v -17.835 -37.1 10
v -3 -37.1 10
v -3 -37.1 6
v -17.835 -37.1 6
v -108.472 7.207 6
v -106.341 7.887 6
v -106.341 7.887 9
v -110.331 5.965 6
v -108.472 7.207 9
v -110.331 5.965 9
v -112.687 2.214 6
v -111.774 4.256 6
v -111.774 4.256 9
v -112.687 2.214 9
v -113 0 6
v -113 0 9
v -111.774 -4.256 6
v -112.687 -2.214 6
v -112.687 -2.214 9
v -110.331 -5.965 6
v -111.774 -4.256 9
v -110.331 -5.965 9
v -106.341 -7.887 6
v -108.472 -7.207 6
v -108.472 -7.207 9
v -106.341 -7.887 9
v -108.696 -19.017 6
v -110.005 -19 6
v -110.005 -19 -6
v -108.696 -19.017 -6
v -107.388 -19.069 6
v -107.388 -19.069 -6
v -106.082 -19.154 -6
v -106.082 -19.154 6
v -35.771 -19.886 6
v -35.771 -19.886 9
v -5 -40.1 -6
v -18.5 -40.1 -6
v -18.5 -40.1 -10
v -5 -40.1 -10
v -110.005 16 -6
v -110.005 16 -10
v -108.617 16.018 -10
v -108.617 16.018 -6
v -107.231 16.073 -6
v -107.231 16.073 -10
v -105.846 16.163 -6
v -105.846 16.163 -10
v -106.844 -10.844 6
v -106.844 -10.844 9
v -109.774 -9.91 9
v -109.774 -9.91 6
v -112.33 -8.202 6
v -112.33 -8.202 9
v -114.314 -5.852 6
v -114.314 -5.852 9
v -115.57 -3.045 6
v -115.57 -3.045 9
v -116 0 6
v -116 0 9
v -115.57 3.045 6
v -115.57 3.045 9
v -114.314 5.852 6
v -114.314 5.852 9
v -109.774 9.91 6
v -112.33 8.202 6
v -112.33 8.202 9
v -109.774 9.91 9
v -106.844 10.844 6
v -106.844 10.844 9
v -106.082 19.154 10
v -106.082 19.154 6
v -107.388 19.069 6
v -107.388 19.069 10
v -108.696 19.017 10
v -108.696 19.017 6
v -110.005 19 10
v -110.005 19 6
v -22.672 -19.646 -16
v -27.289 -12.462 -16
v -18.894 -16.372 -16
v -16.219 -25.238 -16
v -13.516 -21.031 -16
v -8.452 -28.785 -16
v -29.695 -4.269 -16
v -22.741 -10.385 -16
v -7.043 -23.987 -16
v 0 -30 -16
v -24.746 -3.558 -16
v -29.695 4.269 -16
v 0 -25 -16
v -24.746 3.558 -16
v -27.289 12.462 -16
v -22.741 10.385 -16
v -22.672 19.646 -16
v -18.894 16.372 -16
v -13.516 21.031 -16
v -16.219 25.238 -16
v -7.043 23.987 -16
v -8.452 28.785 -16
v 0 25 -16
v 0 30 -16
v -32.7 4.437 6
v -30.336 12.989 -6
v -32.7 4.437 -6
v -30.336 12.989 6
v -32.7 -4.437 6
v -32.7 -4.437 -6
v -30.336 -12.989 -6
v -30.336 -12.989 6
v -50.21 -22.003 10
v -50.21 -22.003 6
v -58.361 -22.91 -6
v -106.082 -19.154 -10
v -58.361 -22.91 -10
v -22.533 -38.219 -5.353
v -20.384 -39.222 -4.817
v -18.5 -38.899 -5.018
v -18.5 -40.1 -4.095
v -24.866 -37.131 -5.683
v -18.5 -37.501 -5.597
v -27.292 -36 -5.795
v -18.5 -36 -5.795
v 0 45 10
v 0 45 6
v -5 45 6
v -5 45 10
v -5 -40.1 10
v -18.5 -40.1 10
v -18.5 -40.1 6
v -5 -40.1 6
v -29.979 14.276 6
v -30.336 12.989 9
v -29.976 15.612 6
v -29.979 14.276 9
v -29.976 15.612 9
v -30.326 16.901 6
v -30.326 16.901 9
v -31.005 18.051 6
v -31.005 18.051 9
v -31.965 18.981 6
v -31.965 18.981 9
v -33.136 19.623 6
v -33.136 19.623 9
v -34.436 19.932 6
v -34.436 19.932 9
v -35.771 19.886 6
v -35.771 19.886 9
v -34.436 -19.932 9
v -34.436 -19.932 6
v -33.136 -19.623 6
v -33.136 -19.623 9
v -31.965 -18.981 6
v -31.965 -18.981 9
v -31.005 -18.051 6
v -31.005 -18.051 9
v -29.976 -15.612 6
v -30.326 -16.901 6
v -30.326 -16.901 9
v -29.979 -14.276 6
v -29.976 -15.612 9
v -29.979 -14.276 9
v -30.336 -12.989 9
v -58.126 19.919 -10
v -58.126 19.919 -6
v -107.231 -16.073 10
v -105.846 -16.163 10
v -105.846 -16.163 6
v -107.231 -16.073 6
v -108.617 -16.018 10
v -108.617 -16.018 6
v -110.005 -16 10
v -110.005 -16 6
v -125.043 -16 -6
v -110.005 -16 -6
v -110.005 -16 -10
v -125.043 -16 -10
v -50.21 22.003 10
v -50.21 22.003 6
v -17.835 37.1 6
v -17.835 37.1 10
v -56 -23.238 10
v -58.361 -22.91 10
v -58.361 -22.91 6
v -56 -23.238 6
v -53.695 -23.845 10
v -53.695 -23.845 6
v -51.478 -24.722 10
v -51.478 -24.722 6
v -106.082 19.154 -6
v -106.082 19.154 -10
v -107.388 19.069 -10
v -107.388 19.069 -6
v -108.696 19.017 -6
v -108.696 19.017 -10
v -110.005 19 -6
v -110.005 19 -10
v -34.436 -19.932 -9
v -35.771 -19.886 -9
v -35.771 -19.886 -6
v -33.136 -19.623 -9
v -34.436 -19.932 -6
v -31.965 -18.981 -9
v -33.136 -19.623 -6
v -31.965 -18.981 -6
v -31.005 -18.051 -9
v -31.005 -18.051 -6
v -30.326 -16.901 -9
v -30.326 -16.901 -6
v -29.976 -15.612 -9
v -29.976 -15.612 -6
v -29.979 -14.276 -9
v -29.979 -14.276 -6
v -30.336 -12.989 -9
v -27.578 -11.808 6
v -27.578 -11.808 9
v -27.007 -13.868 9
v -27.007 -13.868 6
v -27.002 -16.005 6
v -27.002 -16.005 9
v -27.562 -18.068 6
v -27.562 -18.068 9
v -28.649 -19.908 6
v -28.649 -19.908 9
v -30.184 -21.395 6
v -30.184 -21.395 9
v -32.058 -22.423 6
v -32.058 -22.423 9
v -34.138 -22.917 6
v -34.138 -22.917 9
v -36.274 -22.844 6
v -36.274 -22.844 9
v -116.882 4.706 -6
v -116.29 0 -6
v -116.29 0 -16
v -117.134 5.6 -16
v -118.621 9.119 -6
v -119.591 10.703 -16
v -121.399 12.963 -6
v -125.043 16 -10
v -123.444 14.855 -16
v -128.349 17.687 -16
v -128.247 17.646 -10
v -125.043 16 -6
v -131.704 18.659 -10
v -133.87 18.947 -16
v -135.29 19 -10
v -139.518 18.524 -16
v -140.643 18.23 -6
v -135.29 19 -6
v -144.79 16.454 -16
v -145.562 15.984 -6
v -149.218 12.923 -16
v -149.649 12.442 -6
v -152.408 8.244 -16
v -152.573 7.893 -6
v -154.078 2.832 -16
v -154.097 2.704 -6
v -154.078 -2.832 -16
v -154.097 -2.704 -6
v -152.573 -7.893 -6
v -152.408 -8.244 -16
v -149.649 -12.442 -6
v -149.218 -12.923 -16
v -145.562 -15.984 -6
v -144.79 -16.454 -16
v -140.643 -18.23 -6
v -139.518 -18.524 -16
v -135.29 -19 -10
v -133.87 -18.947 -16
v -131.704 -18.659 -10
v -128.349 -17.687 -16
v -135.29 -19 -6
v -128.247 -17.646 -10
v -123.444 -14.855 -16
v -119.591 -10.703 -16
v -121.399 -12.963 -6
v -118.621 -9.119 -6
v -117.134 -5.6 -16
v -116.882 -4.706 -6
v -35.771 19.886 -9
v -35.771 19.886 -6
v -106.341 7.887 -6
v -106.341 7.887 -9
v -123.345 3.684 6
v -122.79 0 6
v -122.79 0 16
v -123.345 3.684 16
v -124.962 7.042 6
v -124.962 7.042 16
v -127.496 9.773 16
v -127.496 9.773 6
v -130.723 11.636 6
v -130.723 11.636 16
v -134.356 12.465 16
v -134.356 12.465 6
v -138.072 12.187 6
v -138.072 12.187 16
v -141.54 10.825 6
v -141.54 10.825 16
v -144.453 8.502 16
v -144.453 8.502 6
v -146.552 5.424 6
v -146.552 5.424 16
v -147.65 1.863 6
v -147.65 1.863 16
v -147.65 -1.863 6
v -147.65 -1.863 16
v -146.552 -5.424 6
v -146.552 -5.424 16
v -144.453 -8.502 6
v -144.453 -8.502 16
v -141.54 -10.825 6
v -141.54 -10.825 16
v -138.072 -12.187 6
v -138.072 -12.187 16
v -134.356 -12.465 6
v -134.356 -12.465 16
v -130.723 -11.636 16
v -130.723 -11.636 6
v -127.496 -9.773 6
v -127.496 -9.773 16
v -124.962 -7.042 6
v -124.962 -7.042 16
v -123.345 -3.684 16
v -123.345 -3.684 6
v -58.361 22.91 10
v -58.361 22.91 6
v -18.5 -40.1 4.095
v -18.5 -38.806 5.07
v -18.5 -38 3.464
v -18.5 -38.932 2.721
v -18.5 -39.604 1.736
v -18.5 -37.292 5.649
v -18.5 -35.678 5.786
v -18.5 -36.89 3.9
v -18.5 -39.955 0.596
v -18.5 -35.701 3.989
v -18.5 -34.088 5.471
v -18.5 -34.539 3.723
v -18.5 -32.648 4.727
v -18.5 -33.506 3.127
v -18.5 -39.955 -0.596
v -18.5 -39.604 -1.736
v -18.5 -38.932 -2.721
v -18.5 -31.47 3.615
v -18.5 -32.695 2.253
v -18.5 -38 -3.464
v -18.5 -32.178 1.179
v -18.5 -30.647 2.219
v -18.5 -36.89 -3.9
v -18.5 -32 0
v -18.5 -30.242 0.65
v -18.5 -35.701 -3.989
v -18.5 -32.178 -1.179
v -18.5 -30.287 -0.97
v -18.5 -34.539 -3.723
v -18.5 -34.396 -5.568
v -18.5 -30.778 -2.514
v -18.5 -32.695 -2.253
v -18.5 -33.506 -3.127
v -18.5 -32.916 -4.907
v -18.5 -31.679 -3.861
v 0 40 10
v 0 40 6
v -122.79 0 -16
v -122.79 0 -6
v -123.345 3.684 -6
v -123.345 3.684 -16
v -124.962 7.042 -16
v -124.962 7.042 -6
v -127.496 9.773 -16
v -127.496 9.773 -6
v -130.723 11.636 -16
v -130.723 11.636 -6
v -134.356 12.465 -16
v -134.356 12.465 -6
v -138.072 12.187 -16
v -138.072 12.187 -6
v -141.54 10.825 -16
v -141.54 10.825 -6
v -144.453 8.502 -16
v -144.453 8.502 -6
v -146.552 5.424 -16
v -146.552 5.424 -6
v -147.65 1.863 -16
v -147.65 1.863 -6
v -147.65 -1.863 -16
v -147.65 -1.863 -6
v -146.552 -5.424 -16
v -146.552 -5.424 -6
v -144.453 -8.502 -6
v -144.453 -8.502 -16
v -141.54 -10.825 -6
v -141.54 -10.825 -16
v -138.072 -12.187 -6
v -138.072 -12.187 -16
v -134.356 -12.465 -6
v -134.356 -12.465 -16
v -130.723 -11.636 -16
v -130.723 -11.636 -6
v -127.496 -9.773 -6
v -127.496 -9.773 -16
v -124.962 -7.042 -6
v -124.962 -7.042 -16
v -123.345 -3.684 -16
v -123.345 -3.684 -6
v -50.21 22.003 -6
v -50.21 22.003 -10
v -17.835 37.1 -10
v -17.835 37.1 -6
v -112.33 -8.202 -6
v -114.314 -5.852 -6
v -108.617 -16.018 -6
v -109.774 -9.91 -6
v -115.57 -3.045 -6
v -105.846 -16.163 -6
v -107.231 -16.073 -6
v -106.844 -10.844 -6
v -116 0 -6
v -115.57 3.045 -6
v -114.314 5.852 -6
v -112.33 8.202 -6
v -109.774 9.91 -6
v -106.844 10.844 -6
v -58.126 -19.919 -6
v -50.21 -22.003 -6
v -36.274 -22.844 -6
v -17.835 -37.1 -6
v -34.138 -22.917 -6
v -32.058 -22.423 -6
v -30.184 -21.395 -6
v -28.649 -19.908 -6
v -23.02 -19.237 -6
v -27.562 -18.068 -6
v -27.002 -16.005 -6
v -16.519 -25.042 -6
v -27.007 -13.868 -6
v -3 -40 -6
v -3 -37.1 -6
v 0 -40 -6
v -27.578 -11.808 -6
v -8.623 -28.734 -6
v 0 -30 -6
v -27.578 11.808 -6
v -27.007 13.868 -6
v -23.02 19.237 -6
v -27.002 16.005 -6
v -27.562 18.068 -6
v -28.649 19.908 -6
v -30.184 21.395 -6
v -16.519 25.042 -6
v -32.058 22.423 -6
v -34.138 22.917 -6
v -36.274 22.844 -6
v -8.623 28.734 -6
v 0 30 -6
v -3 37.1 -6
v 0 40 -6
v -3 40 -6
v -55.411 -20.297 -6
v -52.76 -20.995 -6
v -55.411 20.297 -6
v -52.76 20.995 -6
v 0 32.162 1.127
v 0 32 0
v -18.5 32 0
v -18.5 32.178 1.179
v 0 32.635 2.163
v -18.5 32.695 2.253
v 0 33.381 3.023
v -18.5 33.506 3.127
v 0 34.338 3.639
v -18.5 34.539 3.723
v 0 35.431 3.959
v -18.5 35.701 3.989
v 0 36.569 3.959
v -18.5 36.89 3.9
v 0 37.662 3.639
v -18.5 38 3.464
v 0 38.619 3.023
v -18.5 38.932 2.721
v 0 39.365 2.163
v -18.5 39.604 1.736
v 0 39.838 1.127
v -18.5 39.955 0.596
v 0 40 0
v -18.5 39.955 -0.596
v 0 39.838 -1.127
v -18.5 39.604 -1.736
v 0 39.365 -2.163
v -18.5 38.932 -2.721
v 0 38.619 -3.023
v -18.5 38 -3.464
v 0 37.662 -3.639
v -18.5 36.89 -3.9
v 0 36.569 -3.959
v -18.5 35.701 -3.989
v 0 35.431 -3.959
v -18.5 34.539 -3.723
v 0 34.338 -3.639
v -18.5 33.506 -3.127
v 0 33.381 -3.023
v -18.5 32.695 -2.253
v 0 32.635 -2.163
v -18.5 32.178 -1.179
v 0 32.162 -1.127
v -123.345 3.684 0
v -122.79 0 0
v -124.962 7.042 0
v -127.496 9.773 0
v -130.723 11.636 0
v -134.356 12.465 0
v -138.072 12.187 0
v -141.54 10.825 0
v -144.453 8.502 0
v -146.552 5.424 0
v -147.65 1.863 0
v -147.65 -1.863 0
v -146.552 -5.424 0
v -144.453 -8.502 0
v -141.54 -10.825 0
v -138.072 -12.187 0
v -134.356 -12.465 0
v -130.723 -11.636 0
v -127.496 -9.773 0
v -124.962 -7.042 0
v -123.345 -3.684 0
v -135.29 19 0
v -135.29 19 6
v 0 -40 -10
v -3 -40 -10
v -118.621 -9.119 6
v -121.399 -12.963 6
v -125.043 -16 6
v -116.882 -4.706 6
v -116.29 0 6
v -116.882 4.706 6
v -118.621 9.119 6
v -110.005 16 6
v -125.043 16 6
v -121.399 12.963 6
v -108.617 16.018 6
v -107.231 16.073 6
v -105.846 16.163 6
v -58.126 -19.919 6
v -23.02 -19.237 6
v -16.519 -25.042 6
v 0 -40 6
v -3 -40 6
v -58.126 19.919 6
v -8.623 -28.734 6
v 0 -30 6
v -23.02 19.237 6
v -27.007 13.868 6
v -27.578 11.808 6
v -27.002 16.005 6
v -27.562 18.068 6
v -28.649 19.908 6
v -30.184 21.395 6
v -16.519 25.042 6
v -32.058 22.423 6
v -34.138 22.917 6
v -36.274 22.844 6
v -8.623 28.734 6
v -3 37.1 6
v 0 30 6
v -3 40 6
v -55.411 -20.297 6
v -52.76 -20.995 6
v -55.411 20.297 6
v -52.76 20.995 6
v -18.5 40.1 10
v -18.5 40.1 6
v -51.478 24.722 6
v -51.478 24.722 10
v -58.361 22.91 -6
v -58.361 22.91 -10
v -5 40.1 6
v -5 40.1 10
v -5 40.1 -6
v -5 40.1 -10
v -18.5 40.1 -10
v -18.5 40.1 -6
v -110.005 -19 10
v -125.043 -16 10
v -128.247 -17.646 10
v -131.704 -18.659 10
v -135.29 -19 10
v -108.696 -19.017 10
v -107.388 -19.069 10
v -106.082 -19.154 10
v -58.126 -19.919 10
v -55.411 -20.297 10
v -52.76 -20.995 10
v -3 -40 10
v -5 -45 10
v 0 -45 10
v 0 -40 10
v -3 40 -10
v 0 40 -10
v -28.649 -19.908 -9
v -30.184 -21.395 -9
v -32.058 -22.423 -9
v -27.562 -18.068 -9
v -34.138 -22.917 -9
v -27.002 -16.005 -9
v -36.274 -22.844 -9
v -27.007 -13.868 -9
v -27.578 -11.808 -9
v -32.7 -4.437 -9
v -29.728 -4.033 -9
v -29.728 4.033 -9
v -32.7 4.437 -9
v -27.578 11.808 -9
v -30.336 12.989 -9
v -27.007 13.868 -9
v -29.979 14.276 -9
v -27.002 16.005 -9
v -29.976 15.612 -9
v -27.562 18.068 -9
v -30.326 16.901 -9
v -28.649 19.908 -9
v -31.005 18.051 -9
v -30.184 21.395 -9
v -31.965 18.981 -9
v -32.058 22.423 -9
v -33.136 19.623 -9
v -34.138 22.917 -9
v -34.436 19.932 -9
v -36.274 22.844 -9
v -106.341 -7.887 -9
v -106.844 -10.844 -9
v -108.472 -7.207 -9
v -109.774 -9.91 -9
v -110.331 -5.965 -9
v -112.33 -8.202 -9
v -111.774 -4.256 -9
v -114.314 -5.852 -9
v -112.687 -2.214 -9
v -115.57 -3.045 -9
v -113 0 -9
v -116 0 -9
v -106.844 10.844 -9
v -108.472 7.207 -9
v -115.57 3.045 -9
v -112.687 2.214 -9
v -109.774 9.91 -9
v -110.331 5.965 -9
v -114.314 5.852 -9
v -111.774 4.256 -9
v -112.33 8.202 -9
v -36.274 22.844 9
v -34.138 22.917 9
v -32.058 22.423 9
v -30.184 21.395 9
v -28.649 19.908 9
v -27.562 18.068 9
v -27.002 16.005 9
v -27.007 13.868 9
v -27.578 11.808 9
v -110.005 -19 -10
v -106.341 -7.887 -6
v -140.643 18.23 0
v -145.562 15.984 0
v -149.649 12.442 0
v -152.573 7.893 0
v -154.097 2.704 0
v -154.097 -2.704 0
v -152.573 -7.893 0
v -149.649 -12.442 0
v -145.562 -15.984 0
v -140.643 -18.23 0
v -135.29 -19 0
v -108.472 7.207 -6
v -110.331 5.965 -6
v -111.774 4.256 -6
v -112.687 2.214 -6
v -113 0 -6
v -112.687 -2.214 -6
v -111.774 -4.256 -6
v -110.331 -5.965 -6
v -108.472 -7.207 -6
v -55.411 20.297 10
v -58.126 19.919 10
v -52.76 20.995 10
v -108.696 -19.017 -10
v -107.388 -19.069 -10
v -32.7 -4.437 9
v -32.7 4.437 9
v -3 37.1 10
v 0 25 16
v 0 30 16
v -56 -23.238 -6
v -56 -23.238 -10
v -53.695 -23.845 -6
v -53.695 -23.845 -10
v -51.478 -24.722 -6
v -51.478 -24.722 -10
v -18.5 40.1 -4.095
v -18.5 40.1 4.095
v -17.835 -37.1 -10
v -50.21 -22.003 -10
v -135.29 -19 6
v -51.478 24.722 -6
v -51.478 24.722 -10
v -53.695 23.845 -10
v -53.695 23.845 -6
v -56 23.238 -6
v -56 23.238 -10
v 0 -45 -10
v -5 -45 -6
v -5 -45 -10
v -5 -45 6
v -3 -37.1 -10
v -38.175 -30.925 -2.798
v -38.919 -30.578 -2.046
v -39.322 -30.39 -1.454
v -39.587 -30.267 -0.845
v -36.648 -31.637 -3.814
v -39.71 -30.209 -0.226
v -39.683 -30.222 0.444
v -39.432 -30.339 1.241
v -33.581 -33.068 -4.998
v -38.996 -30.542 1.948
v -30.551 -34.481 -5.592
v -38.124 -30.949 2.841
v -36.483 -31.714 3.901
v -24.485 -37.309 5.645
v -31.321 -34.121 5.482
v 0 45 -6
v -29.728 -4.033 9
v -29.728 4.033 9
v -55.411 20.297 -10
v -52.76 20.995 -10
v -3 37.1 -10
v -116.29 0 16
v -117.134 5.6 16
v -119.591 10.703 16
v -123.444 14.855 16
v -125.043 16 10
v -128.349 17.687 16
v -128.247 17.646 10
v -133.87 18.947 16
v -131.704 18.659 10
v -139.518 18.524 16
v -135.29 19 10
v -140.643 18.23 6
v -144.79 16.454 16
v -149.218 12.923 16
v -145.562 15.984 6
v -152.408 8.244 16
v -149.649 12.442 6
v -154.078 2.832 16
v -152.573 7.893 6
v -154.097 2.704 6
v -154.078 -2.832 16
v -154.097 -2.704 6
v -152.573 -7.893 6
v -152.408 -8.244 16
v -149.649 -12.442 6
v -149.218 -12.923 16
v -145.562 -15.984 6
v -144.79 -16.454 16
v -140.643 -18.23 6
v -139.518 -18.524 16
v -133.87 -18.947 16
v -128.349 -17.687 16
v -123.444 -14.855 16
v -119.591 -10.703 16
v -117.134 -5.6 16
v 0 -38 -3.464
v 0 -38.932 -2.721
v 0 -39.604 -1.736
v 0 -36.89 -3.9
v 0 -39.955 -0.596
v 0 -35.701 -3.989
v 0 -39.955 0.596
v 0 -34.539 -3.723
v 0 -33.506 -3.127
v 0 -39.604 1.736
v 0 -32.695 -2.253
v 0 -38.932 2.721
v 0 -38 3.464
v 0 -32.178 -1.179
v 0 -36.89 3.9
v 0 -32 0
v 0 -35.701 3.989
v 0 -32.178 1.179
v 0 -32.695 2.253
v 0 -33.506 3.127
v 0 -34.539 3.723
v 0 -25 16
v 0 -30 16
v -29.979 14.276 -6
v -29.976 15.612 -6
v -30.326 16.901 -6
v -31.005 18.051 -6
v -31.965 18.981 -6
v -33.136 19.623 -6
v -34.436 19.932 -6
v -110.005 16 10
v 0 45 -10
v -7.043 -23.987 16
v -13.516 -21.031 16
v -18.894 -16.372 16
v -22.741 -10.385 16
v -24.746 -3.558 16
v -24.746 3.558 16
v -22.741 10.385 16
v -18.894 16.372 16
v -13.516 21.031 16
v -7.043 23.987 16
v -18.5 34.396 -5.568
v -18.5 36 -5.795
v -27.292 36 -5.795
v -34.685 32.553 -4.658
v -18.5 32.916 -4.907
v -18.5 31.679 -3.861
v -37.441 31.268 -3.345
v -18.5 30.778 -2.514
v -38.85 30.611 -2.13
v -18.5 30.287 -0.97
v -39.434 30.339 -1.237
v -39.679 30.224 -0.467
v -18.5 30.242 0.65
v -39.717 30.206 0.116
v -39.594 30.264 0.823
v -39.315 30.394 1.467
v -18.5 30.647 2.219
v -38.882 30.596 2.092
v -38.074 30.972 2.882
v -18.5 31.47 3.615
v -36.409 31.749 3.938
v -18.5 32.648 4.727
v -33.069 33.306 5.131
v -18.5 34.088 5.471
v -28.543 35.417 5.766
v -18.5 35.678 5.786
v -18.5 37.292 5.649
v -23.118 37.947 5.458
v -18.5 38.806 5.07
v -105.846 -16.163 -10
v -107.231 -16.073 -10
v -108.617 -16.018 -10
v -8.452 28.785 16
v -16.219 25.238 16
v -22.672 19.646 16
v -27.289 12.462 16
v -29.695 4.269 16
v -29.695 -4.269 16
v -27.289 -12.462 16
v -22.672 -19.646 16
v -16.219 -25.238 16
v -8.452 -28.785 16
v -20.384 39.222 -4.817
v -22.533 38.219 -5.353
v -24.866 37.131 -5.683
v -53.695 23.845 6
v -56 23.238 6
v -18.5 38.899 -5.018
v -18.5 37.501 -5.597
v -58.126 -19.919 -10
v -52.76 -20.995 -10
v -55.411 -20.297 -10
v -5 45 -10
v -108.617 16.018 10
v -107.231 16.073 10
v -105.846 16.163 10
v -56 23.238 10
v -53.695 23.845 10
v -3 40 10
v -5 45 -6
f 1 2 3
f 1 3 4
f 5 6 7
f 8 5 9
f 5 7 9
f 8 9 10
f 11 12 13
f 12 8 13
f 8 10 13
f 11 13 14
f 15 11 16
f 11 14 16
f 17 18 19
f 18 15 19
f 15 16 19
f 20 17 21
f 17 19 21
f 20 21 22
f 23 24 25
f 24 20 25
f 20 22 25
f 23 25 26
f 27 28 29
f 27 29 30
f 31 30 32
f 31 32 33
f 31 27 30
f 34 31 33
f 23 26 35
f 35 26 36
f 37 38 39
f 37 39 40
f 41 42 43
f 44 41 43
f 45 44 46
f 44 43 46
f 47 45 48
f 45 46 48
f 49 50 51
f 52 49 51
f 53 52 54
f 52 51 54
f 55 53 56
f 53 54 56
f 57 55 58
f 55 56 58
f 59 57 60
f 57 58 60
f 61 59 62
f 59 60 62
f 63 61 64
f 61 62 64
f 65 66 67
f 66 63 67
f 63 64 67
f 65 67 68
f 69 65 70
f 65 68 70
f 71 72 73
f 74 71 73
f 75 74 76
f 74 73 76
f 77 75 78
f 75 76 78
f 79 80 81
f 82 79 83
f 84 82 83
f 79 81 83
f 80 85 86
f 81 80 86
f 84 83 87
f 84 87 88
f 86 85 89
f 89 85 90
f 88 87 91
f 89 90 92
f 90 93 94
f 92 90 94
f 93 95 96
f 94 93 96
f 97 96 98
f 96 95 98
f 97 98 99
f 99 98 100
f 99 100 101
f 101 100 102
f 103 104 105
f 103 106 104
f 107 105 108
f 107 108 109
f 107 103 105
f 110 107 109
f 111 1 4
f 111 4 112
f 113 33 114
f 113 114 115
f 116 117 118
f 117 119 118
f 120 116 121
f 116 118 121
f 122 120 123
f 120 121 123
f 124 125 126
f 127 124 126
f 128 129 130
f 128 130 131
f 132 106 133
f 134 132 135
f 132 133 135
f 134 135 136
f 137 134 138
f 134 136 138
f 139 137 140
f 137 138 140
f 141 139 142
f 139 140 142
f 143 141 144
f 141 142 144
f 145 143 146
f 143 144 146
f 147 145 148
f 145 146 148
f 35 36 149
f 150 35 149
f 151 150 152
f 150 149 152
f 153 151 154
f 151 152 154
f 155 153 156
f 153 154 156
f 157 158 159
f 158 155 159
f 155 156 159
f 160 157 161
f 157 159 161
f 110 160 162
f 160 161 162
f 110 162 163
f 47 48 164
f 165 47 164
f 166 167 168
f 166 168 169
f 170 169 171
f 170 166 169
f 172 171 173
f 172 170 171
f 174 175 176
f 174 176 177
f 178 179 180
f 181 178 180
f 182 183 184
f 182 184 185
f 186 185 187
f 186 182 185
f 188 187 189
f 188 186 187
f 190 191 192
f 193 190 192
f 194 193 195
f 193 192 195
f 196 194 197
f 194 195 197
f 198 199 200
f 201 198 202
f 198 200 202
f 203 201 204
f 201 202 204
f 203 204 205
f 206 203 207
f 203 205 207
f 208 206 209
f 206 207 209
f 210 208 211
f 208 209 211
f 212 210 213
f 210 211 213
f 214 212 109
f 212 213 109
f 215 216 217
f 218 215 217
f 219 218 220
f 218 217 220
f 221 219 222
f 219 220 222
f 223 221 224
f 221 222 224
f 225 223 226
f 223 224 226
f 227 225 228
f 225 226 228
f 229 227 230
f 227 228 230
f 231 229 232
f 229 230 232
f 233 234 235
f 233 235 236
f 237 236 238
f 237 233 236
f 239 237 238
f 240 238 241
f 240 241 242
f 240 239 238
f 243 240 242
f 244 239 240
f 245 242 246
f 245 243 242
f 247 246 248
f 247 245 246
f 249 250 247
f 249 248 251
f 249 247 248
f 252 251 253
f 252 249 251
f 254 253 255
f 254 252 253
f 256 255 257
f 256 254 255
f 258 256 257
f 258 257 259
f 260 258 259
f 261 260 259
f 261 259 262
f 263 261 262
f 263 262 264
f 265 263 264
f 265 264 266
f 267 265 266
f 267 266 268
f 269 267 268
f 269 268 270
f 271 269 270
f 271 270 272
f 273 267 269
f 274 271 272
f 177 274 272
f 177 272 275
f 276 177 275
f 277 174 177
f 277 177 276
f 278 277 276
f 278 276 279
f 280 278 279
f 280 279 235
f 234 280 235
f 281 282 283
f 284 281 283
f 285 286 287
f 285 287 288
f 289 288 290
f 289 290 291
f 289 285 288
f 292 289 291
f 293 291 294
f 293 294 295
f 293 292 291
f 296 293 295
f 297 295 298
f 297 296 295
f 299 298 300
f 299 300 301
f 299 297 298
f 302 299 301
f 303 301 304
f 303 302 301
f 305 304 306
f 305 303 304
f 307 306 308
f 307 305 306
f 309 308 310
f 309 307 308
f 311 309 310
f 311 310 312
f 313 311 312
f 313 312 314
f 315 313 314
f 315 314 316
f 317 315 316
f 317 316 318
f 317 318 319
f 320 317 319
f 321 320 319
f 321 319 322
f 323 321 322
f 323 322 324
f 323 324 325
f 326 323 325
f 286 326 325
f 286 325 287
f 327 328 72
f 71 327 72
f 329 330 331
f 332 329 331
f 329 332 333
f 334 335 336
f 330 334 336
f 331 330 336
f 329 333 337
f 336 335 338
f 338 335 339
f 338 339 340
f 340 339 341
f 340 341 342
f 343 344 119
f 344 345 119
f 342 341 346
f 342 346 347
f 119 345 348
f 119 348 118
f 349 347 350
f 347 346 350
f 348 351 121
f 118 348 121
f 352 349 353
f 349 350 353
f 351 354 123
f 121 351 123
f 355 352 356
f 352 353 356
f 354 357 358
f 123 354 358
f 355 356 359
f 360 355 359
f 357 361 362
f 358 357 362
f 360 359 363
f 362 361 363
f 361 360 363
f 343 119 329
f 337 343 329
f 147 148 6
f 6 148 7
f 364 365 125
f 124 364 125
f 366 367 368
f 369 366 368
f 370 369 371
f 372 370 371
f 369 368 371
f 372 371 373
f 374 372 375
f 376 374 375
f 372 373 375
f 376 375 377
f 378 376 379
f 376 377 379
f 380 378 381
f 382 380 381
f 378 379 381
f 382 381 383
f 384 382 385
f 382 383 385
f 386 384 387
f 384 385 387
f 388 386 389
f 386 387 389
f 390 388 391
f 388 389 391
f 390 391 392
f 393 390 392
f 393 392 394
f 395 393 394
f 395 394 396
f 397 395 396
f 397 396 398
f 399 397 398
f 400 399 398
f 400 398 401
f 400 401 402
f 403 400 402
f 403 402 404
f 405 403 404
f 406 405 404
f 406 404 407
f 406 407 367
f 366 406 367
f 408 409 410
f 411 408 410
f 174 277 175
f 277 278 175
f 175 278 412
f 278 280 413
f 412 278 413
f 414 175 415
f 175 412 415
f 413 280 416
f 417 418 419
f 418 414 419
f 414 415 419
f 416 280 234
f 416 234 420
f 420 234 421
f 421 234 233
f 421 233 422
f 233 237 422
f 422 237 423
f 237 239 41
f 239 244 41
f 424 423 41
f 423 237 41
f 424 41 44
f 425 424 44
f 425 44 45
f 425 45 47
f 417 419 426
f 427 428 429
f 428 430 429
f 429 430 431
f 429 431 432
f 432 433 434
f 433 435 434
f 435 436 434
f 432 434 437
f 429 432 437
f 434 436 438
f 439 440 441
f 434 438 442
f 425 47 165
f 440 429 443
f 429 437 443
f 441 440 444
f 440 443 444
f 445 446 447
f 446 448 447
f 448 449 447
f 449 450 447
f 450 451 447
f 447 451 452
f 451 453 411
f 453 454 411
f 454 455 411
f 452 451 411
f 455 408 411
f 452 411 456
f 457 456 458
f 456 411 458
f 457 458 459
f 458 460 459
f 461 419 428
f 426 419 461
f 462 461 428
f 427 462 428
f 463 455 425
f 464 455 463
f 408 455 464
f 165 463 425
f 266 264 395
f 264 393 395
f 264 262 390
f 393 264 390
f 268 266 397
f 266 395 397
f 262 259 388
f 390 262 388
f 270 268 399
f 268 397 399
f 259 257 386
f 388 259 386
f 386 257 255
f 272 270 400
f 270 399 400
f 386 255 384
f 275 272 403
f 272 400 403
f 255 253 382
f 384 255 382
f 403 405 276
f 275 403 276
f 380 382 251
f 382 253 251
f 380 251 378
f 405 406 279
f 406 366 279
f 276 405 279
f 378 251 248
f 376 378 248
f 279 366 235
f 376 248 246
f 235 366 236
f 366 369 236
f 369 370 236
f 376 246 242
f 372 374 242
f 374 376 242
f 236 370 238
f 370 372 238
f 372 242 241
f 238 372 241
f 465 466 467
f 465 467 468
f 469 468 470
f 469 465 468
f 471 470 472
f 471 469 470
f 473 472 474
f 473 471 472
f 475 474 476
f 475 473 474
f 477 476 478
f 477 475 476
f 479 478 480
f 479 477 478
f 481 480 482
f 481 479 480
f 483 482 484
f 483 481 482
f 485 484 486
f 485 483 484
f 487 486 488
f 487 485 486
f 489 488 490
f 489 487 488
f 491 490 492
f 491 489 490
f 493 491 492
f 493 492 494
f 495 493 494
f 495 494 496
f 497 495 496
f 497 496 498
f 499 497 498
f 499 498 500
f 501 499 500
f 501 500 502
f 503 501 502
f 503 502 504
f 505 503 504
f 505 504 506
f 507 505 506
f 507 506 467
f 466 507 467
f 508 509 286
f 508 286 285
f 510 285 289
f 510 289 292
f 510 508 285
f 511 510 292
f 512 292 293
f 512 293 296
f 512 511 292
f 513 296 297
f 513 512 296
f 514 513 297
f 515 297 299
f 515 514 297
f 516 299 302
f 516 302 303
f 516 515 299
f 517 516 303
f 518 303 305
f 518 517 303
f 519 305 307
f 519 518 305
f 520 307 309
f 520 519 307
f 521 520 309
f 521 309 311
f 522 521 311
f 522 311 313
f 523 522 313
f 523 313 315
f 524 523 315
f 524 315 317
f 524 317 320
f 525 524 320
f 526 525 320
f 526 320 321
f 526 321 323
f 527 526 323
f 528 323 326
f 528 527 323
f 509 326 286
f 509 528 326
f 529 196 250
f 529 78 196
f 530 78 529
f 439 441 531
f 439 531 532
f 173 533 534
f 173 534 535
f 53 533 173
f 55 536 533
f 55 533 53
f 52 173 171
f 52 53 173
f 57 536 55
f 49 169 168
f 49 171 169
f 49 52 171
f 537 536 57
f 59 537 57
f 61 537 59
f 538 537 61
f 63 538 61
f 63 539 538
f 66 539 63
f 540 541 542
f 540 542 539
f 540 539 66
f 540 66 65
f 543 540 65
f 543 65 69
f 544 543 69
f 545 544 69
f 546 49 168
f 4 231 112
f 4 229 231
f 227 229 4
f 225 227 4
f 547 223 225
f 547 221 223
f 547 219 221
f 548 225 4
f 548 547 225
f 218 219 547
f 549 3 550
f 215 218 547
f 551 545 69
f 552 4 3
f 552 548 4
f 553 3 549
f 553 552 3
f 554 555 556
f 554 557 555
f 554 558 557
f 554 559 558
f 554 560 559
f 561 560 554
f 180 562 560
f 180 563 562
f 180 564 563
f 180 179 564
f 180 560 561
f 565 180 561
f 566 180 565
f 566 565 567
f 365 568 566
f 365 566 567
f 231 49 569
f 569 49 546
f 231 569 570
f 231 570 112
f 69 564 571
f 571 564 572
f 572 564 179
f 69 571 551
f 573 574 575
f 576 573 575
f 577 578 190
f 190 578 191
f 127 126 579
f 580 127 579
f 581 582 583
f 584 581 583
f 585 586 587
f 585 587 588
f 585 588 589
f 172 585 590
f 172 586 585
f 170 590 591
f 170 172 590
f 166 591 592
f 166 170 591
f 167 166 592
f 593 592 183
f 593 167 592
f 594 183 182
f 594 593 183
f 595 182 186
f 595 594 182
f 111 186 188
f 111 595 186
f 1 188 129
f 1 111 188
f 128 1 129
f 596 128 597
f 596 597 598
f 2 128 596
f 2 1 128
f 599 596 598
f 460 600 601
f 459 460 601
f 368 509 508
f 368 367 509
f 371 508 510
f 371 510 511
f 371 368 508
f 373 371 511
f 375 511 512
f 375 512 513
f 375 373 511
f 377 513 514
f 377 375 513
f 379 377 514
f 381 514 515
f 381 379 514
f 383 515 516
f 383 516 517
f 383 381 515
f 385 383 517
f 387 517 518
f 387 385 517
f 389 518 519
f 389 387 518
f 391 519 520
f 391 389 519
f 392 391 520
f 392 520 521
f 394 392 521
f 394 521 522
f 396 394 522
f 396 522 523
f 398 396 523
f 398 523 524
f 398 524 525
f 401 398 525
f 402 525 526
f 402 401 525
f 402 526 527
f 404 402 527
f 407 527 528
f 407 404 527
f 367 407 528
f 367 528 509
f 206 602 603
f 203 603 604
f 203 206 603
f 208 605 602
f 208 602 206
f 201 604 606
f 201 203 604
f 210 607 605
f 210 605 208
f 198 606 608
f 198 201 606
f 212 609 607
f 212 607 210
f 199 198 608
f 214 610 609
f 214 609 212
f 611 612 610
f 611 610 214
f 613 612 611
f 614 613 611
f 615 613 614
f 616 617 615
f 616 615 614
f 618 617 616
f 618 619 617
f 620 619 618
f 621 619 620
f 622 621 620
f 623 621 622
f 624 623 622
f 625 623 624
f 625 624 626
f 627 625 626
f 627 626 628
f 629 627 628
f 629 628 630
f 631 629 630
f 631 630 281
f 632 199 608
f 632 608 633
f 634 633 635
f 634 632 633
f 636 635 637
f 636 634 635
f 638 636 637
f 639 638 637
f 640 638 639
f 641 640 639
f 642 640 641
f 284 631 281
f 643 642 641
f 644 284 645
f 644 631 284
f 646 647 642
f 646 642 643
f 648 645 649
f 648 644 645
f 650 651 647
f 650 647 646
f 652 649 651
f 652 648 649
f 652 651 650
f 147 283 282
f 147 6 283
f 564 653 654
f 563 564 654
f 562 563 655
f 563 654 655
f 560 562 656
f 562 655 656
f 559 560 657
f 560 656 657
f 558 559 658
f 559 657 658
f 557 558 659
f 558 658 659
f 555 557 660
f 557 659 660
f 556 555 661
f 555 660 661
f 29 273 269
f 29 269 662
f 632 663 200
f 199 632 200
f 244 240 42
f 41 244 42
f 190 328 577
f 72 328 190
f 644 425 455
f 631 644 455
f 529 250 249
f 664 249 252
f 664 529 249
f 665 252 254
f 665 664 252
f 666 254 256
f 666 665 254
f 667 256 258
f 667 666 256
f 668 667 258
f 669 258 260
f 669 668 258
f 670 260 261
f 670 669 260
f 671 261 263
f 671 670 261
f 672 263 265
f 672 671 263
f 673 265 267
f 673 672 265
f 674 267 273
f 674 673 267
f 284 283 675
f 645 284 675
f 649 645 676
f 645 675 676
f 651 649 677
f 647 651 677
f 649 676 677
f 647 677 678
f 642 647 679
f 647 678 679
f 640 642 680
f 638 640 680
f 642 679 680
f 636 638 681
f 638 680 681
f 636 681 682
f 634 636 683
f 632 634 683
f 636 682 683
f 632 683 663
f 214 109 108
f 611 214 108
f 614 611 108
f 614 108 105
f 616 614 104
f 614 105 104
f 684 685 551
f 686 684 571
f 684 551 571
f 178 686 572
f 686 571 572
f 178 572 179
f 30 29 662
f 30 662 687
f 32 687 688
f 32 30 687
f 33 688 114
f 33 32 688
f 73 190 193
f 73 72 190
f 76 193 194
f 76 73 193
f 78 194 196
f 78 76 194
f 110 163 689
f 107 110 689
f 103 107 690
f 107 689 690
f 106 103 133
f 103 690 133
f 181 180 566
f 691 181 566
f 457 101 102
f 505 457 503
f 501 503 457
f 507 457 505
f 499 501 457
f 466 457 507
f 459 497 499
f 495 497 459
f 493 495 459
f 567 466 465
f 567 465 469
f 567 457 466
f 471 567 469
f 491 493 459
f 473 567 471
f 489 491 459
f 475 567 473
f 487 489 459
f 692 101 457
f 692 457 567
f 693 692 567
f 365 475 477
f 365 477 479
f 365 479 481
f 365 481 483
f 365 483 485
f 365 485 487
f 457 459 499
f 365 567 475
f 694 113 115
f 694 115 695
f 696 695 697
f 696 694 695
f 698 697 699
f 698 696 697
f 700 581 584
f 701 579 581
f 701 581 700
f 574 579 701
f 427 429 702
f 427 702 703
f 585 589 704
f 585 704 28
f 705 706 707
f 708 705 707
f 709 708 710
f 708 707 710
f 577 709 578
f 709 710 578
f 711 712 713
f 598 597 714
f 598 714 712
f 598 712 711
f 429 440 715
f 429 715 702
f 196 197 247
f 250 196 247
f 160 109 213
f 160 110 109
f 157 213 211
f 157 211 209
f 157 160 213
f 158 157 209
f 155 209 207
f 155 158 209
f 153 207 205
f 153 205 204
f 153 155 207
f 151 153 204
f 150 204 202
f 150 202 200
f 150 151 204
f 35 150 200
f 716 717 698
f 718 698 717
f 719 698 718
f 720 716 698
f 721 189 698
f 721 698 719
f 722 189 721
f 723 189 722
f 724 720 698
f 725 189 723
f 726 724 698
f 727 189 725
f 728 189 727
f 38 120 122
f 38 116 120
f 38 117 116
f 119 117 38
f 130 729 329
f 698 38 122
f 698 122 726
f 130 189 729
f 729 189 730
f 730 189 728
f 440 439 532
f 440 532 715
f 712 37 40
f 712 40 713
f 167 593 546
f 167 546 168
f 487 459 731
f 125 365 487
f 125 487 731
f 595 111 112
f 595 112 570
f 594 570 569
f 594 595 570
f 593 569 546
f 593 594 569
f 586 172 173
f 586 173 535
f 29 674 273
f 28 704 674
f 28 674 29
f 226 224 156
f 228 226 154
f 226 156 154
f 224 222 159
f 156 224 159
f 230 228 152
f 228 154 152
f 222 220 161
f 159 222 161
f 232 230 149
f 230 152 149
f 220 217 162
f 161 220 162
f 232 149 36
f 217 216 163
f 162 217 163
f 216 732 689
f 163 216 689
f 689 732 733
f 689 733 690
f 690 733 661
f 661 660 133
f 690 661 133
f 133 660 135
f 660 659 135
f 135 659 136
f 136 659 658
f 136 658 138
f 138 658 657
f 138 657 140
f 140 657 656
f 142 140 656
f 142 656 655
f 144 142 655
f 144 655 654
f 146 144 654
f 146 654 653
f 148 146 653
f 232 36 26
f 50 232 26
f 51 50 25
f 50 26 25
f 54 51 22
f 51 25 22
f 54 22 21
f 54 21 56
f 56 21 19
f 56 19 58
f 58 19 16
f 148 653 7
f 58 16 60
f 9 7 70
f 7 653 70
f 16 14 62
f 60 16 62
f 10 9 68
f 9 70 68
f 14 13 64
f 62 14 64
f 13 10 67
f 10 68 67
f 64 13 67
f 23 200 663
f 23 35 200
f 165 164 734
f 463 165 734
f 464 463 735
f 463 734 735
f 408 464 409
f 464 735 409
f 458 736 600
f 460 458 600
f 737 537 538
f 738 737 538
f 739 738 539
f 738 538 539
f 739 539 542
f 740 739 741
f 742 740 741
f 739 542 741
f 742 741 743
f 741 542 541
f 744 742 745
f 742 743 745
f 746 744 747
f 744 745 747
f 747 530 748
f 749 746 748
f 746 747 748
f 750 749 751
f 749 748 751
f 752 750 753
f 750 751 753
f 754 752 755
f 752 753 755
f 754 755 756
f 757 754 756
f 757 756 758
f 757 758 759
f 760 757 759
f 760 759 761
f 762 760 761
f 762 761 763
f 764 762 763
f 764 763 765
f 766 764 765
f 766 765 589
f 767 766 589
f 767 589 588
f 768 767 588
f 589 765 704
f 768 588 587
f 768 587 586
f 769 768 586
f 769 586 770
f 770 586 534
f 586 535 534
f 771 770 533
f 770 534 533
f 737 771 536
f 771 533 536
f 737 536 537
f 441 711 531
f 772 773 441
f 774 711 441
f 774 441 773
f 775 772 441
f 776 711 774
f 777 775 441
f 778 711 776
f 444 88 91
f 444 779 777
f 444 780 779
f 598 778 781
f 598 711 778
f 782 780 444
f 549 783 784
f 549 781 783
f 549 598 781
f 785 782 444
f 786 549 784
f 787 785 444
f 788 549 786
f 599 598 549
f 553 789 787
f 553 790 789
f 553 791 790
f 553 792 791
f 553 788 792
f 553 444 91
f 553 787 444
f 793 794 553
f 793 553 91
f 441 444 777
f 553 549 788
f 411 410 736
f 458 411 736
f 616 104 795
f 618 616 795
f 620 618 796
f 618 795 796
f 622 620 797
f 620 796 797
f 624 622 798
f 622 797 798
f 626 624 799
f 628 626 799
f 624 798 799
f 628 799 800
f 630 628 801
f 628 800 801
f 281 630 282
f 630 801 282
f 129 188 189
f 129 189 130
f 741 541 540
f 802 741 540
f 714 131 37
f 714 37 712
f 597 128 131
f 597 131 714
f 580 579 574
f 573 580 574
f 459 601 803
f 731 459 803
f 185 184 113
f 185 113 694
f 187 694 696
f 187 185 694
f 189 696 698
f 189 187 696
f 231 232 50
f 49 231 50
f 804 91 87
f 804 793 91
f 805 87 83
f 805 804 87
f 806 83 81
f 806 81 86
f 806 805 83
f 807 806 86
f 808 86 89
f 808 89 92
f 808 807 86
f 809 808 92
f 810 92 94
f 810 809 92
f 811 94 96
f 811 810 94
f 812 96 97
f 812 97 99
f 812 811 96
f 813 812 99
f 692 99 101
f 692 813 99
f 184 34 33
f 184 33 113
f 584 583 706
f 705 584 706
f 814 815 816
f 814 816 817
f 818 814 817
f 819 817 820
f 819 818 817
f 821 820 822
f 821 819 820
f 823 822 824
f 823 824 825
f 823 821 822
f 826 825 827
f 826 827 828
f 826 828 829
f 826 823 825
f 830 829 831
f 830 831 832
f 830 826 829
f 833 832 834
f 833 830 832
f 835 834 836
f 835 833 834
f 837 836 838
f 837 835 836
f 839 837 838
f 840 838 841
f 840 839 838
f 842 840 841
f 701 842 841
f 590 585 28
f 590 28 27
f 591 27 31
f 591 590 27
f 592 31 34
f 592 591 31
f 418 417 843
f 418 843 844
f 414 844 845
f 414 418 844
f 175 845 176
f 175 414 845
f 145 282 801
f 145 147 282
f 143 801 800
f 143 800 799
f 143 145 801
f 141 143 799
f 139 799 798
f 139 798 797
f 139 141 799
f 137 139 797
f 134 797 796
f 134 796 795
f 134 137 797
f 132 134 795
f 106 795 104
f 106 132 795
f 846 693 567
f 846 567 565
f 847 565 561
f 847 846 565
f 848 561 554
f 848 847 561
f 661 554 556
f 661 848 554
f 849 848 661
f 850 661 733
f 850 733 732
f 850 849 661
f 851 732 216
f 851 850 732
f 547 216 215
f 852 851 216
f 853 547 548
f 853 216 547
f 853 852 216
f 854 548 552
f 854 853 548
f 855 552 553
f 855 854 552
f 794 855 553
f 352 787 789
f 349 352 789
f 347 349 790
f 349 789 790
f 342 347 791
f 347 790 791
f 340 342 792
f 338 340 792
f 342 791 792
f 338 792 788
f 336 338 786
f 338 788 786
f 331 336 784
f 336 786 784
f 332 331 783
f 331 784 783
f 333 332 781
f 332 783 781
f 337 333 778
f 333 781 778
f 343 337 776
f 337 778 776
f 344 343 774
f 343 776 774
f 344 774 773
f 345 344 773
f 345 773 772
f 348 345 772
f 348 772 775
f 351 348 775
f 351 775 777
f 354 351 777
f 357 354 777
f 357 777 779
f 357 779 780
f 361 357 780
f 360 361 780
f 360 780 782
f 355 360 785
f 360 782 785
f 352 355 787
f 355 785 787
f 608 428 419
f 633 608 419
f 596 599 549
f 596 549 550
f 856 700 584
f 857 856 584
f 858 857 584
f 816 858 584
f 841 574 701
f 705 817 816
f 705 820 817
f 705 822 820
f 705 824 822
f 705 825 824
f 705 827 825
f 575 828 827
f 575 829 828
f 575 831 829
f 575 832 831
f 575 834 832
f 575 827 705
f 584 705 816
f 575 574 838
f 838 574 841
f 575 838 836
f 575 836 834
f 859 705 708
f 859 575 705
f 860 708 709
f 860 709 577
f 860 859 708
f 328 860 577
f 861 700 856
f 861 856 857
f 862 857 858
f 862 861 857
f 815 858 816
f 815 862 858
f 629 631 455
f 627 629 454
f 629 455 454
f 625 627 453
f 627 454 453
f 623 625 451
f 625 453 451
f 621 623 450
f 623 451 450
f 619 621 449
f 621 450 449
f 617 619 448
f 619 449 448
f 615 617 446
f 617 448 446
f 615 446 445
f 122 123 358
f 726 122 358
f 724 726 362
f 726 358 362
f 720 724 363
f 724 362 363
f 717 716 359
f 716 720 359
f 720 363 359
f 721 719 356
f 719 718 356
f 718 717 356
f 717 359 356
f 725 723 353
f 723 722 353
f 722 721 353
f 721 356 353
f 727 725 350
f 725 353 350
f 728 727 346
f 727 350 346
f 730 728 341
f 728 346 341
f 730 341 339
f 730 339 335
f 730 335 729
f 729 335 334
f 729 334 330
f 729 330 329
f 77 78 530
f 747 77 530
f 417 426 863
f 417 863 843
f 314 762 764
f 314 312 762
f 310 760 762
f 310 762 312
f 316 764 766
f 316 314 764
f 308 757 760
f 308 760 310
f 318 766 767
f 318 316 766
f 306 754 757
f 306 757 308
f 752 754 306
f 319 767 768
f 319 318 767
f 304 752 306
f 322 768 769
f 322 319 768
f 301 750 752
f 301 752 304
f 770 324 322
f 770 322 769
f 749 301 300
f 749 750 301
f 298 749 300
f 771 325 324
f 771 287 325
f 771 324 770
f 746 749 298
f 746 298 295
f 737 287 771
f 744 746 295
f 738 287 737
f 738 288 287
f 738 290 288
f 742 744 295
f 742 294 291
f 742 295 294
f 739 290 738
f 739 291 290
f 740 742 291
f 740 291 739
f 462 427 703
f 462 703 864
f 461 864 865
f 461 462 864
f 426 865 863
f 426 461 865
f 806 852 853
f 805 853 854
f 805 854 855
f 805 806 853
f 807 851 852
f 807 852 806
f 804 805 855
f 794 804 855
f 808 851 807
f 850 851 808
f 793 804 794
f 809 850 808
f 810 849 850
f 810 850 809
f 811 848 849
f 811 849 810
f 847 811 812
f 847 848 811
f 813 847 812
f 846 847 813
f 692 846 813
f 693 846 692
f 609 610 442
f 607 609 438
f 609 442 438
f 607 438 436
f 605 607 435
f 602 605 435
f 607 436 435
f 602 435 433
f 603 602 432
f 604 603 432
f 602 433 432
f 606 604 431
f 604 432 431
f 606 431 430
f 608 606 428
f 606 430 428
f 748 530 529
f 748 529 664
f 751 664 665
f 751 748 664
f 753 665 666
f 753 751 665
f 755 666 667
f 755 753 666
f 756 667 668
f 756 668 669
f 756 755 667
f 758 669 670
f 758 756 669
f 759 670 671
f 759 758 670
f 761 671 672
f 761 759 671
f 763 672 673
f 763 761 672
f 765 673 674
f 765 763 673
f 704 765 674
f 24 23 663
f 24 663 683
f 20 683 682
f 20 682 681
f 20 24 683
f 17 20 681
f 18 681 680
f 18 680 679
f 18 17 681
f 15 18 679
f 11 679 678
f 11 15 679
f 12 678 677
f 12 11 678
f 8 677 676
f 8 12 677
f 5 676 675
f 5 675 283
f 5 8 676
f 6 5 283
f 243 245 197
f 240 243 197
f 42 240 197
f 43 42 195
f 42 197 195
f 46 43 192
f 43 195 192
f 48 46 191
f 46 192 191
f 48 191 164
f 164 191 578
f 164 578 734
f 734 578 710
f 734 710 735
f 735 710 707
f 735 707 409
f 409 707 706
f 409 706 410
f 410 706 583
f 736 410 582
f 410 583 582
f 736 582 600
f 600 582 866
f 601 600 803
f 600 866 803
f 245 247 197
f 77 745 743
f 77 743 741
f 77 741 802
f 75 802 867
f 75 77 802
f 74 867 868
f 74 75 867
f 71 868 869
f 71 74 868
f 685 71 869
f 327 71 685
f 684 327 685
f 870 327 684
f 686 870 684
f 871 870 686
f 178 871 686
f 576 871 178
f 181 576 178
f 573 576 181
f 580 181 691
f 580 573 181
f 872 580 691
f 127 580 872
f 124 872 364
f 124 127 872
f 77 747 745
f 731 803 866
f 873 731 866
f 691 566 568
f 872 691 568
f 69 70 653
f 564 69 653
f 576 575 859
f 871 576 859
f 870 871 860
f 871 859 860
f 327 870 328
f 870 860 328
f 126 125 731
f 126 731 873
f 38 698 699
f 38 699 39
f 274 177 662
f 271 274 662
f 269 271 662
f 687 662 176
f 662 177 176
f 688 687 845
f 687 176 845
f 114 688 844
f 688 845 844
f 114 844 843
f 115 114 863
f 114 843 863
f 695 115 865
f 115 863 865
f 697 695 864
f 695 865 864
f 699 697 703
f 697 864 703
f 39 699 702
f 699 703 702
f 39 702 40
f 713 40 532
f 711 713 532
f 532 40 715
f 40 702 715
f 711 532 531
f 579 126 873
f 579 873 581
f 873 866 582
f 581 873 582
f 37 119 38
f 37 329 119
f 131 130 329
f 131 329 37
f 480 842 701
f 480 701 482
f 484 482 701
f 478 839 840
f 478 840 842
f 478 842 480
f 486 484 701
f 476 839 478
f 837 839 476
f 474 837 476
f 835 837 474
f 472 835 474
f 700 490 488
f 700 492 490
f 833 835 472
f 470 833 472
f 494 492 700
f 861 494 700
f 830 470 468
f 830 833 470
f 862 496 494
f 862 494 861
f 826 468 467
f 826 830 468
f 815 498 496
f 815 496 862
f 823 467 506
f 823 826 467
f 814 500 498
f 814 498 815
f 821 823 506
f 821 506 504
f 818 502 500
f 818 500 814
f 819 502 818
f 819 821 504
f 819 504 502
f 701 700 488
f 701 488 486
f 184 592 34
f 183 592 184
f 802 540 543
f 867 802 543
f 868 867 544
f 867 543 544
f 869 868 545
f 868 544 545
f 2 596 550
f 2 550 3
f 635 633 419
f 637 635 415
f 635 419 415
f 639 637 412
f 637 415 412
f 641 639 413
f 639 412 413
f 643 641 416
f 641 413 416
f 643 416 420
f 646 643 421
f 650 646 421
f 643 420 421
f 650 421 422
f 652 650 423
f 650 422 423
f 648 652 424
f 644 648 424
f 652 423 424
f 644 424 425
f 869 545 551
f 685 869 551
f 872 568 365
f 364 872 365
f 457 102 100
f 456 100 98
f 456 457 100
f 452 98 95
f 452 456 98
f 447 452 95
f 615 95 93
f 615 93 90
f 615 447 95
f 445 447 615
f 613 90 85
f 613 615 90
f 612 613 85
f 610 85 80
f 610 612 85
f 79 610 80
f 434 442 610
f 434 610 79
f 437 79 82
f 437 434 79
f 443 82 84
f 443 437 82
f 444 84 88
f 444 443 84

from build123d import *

# Parameters (mm, degrees)
SKETCH1_R           = 12.5
BOSS_EXTRUDE1_DEPTH = 6
SKETCH1_4_R         = 19
SKETCH1_4_R_2       = 12.5
BOSS_EXTRUDE2_DEPTH = 16
BOSS_EXTRUDE3_DEPTH = 10
SKETCH3_R           = 4
CUT_EXTRUDE2_DEPTH  = 18.5
SKETCH4_R           = 5.795
CUT_EXTRUDE4_DEPTH  = 144.94417008
BOSS_EXTRUDE4_DEPTH = 9


with BuildPart() as part:
    # Sketch1 → Boss-Extrude1 (new, symmetric)
    with BuildSketch(Plane.XY):
        with BuildLine():
            Line((-110.00450535, 19), (-135.29, 19))
            ThreePointArc((-135.29, 19), (-154.29, 0), (-135.29, -19))
            Line((-135.29, -19), (-110.00450535, -19))
            ThreePointArc((-110.00450535, -19), (-108.041514562, -19.038548188), (-106.081550564, -19.154133313))
            Line((-106.081550564, -19.154133313), (-58.361460534, -22.909785849))
            ThreePointArc((-58.361460534, -22.909785849), (-54.838603484, -23.507213745), (-51.478277214, -24.721976782))
            Line((-51.478277214, -24.721976782), (-18.5, -40.1))
            Line((-18.5, -40.1), (-5, -40.1))
            Line((-5, -40.1), (-5, -45))
            Line((-5, -45), (0, -45))
            Line((0, -45), (0, -25))
            ThreePointArc((0, -25), (-25, 0), (0, 25))
            Line((0, 25), (0, 45))
            Line((0, 45), (-5, 45))
            Line((-5, 45), (-5, 40.1))
            Line((-5, 40.1), (-18.5, 40.1))
            Line((-18.5, 40.1), (-51.478277214, 24.721976782))
            ThreePointArc((-51.478277214, 24.721976782), (-54.838603484, 23.507213745), (-58.361460534, 22.909785849))
            Line((-58.361460534, 22.909785849), (-106.081550564, 19.154133313))
            ThreePointArc((-106.081550564, 19.154133313), (-108.041514562, 19.038548188), (-110.00450535, 19))
        make_face()
        with BuildLine():
            ThreePointArc((-106.341033016, -7.886801028), (-113, 0), (-106.341033016, 7.886801028))
            Line((-106.341033016, 7.886801028), (-35.770781366, 19.886220952))
            ThreePointArc((-35.770781366, 19.886220952), (-31.0052687, 18.051447358), (-30.336236293, 12.988947901))
            ThreePointArc((-30.336236293, 12.988947901), (-33, 0), (-30.336236293, -12.988947901))
            ThreePointArc((-30.336236293, -12.988947901), (-31.0052687, -18.051447358), (-35.770781366, -19.886220952))
            Line((-35.770781366, -19.886220952), (-106.341033016, -7.886801028))
        make_face(mode=Mode.SUBTRACT)
        with Locations((-135.29, 0)):
            Circle(SKETCH1_R, mode=Mode.SUBTRACT)
    extrude(amount=BOSS_EXTRUDE1_DEPTH, both=True)

    # Sketch1<4> → Boss-Extrude2 (add, symmetric)
    # profile 1 of 2: a face of its own
    with BuildSketch(Plane.XY):
        with Locations((-135.29, 0)):
            Circle(SKETCH1_4_R)
        with Locations((-135.29, 0)):
            Circle(SKETCH1_4_R_2, mode=Mode.SUBTRACT)
    # profile 2 of 2: a face of its own
    with BuildSketch(Plane.XY):
        with BuildLine():
            Line((0, 25), (0, 30))
            ThreePointArc((0, 30), (-30, 0), (0, -30))
            Line((0, -30), (0, -25))
            ThreePointArc((0, -25), (-25, 0), (0, 25))
        make_face()
    extrude(amount=BOSS_EXTRUDE2_DEPTH, both=True)

    # Sketch2 → Boss-Extrude3 (add, symmetric)
    with BuildSketch(Plane.XY):
        with BuildLine():
            Line((-5, 45), (-5, 40.1))
            Line((-5, 40.1), (-18.5, 40.1))
            Line((-18.5, 40.1), (-51.478277214, 24.721976782))
            ThreePointArc((-51.478277214, 24.721976782), (-54.838603484, 23.507213745), (-58.361460534, 22.909785849))
            Line((-58.361460534, 22.909785849), (-106.081550564, 19.154133313))
            ThreePointArc((-106.081550564, 19.154133313), (-108.041514562, 19.038548188), (-110.00450535, 19))
            Line((-110.00450535, 19), (-135.29, 19))
            ThreePointArc((-135.29, 19), (-129.951460874, 18.234582529), (-125.043049234, 16))
            Line((-125.043049234, 16), (-110.00450535, 16))
            ThreePointArc((-110.00450535, 16), (-107.923735115, 16.040861079), (-105.846173277, 16.163381312))
            Line((-105.846173277, 16.163381312), (-58.126083247, 19.919033847))
            ThreePointArc((-58.126083247, 19.919033847), (-54.07479764, 20.606075928), (-50.210422429, 22.003053421))
            Line((-50.210422429, 22.003053421), (-17.834916012, 37.1))
            Line((-17.834916012, 37.1), (-3, 37.1))
            Line((-3, 37.1), (-3, 40))
            Line((-3, 40), (0, 40))
            Line((0, 40), (0, 45))
            Line((0, 45), (-5, 45))
        make_face()
        with BuildLine():
            Line((0, -40), (-3, -40))
            Line((-3, -40), (-3, -37.1))
            Line((-3, -37.1), (-17.834916012, -37.1))
            Line((-17.834916012, -37.1), (-50.210422429, -22.003053421))
            ThreePointArc((-50.210422429, -22.003053421), (-54.07479764, -20.606075928), (-58.126083247, -19.919033847))
            Line((-58.126083247, -19.919033847), (-105.846173277, -16.163381312))
            ThreePointArc((-105.846173277, -16.163381312), (-107.923735115, -16.040861079), (-110.00450535, -16))
            Line((-110.00450535, -16), (-125.043049234, -16))
            ThreePointArc((-125.043049234, -16), (-129.951460874, -18.234582529), (-135.29, -19))
            Line((-135.29, -19), (-110.00450535, -19))
            ThreePointArc((-110.00450535, -19), (-108.041514562, -19.038548188), (-106.081550564, -19.154133313))
            Line((-106.081550564, -19.154133313), (-58.361460534, -22.909785849))
            ThreePointArc((-58.361460534, -22.909785849), (-54.838603484, -23.507213745), (-51.478277214, -24.721976782))
            Line((-51.478277214, -24.721976782), (-18.5, -40.1))
            Line((-18.5, -40.1), (-5, -40.1))
            Line((-5, -40.1), (-5, -45))
            Line((-5, -45), (0, -45))
            Line((0, -45), (0, -40))
        make_face()
    extrude(amount=BOSS_EXTRUDE3_DEPTH, both=True)

    # Sketch3 → Cut-Extrude2 (cut)
    with BuildSketch(Plane(origin=(0, 0, 0), x_dir=(0, 0, -1), z_dir=(1, 0, 0))):
        with Locations((0, -36)):
            Circle(SKETCH3_R)
    cut_extrude2 = extrude(amount=-CUT_EXTRUDE2_DEPTH, mode=Mode.SUBTRACT)

    # Sketch4 → Cut-Extrude4 (cut, through all)
    with BuildSketch(Plane(origin=(-18.5, 0, 0), x_dir=(0, 0, -1), z_dir=(1, 0, 0))):
        with Locations((0, -36)):
            Circle(SKETCH4_R)
    cut_extrude4 = extrude(amount=-CUT_EXTRUDE4_DEPTH, mode=Mode.SUBTRACT)

    # Mirror1: Cut-Extrude2, Cut-Extrude4 across plane
    add(cut_extrude2.mirror(Plane.ZX), mode=Mode.SUBTRACT)
    add(cut_extrude4.mirror(Plane.ZX), mode=Mode.SUBTRACT)

    # Sketch5 → Boss-Extrude4 (add, symmetric)
    with BuildSketch(Plane.XY):
        with BuildLine():
            Line((-106.843920397, 10.844351413), (-36.273668747, 22.843771338))
            ThreePointArc((-36.273668747, 22.843771338), (-28.648848481, 19.908133587), (-27.57839663, 11.808134455))
            ThreePointArc((-27.57839663, 11.808134455), (-30, 0), (-27.57839663, -11.808134455))
            ThreePointArc((-27.57839663, -11.808134455), (-28.648848481, -19.908133587), (-36.273668747, -22.843771338))
            Line((-36.273668747, -22.843771338), (-106.843920397, -10.844351413))
            ThreePointArc((-106.843920397, -10.844351413), (-116, 0), (-106.843920397, 10.844351413))
        make_face()
        with BuildLine():
            Line((-106.341033016, -7.886801028), (-35.770781366, -19.886220952))
            ThreePointArc((-35.770781366, -19.886220952), (-31.0052687, -18.051447358), (-30.336236293, -12.988947901))
            ThreePointArc((-30.336236293, -12.988947901), (-33, 0), (-30.336236293, 12.988947901))
            ThreePointArc((-30.336236293, 12.988947901), (-31.0052687, 18.051447358), (-35.770781366, 19.886220952))
            Line((-35.770781366, 19.886220952), (-106.341033016, 7.886801028))
            ThreePointArc((-106.341033016, 7.886801028), (-113, 0), (-106.341033016, -7.886801028))
        make_face(mode=Mode.SUBTRACT)
    extrude(amount=BOSS_EXTRUDE4_DEPTH, both=True)


solid = part.part
